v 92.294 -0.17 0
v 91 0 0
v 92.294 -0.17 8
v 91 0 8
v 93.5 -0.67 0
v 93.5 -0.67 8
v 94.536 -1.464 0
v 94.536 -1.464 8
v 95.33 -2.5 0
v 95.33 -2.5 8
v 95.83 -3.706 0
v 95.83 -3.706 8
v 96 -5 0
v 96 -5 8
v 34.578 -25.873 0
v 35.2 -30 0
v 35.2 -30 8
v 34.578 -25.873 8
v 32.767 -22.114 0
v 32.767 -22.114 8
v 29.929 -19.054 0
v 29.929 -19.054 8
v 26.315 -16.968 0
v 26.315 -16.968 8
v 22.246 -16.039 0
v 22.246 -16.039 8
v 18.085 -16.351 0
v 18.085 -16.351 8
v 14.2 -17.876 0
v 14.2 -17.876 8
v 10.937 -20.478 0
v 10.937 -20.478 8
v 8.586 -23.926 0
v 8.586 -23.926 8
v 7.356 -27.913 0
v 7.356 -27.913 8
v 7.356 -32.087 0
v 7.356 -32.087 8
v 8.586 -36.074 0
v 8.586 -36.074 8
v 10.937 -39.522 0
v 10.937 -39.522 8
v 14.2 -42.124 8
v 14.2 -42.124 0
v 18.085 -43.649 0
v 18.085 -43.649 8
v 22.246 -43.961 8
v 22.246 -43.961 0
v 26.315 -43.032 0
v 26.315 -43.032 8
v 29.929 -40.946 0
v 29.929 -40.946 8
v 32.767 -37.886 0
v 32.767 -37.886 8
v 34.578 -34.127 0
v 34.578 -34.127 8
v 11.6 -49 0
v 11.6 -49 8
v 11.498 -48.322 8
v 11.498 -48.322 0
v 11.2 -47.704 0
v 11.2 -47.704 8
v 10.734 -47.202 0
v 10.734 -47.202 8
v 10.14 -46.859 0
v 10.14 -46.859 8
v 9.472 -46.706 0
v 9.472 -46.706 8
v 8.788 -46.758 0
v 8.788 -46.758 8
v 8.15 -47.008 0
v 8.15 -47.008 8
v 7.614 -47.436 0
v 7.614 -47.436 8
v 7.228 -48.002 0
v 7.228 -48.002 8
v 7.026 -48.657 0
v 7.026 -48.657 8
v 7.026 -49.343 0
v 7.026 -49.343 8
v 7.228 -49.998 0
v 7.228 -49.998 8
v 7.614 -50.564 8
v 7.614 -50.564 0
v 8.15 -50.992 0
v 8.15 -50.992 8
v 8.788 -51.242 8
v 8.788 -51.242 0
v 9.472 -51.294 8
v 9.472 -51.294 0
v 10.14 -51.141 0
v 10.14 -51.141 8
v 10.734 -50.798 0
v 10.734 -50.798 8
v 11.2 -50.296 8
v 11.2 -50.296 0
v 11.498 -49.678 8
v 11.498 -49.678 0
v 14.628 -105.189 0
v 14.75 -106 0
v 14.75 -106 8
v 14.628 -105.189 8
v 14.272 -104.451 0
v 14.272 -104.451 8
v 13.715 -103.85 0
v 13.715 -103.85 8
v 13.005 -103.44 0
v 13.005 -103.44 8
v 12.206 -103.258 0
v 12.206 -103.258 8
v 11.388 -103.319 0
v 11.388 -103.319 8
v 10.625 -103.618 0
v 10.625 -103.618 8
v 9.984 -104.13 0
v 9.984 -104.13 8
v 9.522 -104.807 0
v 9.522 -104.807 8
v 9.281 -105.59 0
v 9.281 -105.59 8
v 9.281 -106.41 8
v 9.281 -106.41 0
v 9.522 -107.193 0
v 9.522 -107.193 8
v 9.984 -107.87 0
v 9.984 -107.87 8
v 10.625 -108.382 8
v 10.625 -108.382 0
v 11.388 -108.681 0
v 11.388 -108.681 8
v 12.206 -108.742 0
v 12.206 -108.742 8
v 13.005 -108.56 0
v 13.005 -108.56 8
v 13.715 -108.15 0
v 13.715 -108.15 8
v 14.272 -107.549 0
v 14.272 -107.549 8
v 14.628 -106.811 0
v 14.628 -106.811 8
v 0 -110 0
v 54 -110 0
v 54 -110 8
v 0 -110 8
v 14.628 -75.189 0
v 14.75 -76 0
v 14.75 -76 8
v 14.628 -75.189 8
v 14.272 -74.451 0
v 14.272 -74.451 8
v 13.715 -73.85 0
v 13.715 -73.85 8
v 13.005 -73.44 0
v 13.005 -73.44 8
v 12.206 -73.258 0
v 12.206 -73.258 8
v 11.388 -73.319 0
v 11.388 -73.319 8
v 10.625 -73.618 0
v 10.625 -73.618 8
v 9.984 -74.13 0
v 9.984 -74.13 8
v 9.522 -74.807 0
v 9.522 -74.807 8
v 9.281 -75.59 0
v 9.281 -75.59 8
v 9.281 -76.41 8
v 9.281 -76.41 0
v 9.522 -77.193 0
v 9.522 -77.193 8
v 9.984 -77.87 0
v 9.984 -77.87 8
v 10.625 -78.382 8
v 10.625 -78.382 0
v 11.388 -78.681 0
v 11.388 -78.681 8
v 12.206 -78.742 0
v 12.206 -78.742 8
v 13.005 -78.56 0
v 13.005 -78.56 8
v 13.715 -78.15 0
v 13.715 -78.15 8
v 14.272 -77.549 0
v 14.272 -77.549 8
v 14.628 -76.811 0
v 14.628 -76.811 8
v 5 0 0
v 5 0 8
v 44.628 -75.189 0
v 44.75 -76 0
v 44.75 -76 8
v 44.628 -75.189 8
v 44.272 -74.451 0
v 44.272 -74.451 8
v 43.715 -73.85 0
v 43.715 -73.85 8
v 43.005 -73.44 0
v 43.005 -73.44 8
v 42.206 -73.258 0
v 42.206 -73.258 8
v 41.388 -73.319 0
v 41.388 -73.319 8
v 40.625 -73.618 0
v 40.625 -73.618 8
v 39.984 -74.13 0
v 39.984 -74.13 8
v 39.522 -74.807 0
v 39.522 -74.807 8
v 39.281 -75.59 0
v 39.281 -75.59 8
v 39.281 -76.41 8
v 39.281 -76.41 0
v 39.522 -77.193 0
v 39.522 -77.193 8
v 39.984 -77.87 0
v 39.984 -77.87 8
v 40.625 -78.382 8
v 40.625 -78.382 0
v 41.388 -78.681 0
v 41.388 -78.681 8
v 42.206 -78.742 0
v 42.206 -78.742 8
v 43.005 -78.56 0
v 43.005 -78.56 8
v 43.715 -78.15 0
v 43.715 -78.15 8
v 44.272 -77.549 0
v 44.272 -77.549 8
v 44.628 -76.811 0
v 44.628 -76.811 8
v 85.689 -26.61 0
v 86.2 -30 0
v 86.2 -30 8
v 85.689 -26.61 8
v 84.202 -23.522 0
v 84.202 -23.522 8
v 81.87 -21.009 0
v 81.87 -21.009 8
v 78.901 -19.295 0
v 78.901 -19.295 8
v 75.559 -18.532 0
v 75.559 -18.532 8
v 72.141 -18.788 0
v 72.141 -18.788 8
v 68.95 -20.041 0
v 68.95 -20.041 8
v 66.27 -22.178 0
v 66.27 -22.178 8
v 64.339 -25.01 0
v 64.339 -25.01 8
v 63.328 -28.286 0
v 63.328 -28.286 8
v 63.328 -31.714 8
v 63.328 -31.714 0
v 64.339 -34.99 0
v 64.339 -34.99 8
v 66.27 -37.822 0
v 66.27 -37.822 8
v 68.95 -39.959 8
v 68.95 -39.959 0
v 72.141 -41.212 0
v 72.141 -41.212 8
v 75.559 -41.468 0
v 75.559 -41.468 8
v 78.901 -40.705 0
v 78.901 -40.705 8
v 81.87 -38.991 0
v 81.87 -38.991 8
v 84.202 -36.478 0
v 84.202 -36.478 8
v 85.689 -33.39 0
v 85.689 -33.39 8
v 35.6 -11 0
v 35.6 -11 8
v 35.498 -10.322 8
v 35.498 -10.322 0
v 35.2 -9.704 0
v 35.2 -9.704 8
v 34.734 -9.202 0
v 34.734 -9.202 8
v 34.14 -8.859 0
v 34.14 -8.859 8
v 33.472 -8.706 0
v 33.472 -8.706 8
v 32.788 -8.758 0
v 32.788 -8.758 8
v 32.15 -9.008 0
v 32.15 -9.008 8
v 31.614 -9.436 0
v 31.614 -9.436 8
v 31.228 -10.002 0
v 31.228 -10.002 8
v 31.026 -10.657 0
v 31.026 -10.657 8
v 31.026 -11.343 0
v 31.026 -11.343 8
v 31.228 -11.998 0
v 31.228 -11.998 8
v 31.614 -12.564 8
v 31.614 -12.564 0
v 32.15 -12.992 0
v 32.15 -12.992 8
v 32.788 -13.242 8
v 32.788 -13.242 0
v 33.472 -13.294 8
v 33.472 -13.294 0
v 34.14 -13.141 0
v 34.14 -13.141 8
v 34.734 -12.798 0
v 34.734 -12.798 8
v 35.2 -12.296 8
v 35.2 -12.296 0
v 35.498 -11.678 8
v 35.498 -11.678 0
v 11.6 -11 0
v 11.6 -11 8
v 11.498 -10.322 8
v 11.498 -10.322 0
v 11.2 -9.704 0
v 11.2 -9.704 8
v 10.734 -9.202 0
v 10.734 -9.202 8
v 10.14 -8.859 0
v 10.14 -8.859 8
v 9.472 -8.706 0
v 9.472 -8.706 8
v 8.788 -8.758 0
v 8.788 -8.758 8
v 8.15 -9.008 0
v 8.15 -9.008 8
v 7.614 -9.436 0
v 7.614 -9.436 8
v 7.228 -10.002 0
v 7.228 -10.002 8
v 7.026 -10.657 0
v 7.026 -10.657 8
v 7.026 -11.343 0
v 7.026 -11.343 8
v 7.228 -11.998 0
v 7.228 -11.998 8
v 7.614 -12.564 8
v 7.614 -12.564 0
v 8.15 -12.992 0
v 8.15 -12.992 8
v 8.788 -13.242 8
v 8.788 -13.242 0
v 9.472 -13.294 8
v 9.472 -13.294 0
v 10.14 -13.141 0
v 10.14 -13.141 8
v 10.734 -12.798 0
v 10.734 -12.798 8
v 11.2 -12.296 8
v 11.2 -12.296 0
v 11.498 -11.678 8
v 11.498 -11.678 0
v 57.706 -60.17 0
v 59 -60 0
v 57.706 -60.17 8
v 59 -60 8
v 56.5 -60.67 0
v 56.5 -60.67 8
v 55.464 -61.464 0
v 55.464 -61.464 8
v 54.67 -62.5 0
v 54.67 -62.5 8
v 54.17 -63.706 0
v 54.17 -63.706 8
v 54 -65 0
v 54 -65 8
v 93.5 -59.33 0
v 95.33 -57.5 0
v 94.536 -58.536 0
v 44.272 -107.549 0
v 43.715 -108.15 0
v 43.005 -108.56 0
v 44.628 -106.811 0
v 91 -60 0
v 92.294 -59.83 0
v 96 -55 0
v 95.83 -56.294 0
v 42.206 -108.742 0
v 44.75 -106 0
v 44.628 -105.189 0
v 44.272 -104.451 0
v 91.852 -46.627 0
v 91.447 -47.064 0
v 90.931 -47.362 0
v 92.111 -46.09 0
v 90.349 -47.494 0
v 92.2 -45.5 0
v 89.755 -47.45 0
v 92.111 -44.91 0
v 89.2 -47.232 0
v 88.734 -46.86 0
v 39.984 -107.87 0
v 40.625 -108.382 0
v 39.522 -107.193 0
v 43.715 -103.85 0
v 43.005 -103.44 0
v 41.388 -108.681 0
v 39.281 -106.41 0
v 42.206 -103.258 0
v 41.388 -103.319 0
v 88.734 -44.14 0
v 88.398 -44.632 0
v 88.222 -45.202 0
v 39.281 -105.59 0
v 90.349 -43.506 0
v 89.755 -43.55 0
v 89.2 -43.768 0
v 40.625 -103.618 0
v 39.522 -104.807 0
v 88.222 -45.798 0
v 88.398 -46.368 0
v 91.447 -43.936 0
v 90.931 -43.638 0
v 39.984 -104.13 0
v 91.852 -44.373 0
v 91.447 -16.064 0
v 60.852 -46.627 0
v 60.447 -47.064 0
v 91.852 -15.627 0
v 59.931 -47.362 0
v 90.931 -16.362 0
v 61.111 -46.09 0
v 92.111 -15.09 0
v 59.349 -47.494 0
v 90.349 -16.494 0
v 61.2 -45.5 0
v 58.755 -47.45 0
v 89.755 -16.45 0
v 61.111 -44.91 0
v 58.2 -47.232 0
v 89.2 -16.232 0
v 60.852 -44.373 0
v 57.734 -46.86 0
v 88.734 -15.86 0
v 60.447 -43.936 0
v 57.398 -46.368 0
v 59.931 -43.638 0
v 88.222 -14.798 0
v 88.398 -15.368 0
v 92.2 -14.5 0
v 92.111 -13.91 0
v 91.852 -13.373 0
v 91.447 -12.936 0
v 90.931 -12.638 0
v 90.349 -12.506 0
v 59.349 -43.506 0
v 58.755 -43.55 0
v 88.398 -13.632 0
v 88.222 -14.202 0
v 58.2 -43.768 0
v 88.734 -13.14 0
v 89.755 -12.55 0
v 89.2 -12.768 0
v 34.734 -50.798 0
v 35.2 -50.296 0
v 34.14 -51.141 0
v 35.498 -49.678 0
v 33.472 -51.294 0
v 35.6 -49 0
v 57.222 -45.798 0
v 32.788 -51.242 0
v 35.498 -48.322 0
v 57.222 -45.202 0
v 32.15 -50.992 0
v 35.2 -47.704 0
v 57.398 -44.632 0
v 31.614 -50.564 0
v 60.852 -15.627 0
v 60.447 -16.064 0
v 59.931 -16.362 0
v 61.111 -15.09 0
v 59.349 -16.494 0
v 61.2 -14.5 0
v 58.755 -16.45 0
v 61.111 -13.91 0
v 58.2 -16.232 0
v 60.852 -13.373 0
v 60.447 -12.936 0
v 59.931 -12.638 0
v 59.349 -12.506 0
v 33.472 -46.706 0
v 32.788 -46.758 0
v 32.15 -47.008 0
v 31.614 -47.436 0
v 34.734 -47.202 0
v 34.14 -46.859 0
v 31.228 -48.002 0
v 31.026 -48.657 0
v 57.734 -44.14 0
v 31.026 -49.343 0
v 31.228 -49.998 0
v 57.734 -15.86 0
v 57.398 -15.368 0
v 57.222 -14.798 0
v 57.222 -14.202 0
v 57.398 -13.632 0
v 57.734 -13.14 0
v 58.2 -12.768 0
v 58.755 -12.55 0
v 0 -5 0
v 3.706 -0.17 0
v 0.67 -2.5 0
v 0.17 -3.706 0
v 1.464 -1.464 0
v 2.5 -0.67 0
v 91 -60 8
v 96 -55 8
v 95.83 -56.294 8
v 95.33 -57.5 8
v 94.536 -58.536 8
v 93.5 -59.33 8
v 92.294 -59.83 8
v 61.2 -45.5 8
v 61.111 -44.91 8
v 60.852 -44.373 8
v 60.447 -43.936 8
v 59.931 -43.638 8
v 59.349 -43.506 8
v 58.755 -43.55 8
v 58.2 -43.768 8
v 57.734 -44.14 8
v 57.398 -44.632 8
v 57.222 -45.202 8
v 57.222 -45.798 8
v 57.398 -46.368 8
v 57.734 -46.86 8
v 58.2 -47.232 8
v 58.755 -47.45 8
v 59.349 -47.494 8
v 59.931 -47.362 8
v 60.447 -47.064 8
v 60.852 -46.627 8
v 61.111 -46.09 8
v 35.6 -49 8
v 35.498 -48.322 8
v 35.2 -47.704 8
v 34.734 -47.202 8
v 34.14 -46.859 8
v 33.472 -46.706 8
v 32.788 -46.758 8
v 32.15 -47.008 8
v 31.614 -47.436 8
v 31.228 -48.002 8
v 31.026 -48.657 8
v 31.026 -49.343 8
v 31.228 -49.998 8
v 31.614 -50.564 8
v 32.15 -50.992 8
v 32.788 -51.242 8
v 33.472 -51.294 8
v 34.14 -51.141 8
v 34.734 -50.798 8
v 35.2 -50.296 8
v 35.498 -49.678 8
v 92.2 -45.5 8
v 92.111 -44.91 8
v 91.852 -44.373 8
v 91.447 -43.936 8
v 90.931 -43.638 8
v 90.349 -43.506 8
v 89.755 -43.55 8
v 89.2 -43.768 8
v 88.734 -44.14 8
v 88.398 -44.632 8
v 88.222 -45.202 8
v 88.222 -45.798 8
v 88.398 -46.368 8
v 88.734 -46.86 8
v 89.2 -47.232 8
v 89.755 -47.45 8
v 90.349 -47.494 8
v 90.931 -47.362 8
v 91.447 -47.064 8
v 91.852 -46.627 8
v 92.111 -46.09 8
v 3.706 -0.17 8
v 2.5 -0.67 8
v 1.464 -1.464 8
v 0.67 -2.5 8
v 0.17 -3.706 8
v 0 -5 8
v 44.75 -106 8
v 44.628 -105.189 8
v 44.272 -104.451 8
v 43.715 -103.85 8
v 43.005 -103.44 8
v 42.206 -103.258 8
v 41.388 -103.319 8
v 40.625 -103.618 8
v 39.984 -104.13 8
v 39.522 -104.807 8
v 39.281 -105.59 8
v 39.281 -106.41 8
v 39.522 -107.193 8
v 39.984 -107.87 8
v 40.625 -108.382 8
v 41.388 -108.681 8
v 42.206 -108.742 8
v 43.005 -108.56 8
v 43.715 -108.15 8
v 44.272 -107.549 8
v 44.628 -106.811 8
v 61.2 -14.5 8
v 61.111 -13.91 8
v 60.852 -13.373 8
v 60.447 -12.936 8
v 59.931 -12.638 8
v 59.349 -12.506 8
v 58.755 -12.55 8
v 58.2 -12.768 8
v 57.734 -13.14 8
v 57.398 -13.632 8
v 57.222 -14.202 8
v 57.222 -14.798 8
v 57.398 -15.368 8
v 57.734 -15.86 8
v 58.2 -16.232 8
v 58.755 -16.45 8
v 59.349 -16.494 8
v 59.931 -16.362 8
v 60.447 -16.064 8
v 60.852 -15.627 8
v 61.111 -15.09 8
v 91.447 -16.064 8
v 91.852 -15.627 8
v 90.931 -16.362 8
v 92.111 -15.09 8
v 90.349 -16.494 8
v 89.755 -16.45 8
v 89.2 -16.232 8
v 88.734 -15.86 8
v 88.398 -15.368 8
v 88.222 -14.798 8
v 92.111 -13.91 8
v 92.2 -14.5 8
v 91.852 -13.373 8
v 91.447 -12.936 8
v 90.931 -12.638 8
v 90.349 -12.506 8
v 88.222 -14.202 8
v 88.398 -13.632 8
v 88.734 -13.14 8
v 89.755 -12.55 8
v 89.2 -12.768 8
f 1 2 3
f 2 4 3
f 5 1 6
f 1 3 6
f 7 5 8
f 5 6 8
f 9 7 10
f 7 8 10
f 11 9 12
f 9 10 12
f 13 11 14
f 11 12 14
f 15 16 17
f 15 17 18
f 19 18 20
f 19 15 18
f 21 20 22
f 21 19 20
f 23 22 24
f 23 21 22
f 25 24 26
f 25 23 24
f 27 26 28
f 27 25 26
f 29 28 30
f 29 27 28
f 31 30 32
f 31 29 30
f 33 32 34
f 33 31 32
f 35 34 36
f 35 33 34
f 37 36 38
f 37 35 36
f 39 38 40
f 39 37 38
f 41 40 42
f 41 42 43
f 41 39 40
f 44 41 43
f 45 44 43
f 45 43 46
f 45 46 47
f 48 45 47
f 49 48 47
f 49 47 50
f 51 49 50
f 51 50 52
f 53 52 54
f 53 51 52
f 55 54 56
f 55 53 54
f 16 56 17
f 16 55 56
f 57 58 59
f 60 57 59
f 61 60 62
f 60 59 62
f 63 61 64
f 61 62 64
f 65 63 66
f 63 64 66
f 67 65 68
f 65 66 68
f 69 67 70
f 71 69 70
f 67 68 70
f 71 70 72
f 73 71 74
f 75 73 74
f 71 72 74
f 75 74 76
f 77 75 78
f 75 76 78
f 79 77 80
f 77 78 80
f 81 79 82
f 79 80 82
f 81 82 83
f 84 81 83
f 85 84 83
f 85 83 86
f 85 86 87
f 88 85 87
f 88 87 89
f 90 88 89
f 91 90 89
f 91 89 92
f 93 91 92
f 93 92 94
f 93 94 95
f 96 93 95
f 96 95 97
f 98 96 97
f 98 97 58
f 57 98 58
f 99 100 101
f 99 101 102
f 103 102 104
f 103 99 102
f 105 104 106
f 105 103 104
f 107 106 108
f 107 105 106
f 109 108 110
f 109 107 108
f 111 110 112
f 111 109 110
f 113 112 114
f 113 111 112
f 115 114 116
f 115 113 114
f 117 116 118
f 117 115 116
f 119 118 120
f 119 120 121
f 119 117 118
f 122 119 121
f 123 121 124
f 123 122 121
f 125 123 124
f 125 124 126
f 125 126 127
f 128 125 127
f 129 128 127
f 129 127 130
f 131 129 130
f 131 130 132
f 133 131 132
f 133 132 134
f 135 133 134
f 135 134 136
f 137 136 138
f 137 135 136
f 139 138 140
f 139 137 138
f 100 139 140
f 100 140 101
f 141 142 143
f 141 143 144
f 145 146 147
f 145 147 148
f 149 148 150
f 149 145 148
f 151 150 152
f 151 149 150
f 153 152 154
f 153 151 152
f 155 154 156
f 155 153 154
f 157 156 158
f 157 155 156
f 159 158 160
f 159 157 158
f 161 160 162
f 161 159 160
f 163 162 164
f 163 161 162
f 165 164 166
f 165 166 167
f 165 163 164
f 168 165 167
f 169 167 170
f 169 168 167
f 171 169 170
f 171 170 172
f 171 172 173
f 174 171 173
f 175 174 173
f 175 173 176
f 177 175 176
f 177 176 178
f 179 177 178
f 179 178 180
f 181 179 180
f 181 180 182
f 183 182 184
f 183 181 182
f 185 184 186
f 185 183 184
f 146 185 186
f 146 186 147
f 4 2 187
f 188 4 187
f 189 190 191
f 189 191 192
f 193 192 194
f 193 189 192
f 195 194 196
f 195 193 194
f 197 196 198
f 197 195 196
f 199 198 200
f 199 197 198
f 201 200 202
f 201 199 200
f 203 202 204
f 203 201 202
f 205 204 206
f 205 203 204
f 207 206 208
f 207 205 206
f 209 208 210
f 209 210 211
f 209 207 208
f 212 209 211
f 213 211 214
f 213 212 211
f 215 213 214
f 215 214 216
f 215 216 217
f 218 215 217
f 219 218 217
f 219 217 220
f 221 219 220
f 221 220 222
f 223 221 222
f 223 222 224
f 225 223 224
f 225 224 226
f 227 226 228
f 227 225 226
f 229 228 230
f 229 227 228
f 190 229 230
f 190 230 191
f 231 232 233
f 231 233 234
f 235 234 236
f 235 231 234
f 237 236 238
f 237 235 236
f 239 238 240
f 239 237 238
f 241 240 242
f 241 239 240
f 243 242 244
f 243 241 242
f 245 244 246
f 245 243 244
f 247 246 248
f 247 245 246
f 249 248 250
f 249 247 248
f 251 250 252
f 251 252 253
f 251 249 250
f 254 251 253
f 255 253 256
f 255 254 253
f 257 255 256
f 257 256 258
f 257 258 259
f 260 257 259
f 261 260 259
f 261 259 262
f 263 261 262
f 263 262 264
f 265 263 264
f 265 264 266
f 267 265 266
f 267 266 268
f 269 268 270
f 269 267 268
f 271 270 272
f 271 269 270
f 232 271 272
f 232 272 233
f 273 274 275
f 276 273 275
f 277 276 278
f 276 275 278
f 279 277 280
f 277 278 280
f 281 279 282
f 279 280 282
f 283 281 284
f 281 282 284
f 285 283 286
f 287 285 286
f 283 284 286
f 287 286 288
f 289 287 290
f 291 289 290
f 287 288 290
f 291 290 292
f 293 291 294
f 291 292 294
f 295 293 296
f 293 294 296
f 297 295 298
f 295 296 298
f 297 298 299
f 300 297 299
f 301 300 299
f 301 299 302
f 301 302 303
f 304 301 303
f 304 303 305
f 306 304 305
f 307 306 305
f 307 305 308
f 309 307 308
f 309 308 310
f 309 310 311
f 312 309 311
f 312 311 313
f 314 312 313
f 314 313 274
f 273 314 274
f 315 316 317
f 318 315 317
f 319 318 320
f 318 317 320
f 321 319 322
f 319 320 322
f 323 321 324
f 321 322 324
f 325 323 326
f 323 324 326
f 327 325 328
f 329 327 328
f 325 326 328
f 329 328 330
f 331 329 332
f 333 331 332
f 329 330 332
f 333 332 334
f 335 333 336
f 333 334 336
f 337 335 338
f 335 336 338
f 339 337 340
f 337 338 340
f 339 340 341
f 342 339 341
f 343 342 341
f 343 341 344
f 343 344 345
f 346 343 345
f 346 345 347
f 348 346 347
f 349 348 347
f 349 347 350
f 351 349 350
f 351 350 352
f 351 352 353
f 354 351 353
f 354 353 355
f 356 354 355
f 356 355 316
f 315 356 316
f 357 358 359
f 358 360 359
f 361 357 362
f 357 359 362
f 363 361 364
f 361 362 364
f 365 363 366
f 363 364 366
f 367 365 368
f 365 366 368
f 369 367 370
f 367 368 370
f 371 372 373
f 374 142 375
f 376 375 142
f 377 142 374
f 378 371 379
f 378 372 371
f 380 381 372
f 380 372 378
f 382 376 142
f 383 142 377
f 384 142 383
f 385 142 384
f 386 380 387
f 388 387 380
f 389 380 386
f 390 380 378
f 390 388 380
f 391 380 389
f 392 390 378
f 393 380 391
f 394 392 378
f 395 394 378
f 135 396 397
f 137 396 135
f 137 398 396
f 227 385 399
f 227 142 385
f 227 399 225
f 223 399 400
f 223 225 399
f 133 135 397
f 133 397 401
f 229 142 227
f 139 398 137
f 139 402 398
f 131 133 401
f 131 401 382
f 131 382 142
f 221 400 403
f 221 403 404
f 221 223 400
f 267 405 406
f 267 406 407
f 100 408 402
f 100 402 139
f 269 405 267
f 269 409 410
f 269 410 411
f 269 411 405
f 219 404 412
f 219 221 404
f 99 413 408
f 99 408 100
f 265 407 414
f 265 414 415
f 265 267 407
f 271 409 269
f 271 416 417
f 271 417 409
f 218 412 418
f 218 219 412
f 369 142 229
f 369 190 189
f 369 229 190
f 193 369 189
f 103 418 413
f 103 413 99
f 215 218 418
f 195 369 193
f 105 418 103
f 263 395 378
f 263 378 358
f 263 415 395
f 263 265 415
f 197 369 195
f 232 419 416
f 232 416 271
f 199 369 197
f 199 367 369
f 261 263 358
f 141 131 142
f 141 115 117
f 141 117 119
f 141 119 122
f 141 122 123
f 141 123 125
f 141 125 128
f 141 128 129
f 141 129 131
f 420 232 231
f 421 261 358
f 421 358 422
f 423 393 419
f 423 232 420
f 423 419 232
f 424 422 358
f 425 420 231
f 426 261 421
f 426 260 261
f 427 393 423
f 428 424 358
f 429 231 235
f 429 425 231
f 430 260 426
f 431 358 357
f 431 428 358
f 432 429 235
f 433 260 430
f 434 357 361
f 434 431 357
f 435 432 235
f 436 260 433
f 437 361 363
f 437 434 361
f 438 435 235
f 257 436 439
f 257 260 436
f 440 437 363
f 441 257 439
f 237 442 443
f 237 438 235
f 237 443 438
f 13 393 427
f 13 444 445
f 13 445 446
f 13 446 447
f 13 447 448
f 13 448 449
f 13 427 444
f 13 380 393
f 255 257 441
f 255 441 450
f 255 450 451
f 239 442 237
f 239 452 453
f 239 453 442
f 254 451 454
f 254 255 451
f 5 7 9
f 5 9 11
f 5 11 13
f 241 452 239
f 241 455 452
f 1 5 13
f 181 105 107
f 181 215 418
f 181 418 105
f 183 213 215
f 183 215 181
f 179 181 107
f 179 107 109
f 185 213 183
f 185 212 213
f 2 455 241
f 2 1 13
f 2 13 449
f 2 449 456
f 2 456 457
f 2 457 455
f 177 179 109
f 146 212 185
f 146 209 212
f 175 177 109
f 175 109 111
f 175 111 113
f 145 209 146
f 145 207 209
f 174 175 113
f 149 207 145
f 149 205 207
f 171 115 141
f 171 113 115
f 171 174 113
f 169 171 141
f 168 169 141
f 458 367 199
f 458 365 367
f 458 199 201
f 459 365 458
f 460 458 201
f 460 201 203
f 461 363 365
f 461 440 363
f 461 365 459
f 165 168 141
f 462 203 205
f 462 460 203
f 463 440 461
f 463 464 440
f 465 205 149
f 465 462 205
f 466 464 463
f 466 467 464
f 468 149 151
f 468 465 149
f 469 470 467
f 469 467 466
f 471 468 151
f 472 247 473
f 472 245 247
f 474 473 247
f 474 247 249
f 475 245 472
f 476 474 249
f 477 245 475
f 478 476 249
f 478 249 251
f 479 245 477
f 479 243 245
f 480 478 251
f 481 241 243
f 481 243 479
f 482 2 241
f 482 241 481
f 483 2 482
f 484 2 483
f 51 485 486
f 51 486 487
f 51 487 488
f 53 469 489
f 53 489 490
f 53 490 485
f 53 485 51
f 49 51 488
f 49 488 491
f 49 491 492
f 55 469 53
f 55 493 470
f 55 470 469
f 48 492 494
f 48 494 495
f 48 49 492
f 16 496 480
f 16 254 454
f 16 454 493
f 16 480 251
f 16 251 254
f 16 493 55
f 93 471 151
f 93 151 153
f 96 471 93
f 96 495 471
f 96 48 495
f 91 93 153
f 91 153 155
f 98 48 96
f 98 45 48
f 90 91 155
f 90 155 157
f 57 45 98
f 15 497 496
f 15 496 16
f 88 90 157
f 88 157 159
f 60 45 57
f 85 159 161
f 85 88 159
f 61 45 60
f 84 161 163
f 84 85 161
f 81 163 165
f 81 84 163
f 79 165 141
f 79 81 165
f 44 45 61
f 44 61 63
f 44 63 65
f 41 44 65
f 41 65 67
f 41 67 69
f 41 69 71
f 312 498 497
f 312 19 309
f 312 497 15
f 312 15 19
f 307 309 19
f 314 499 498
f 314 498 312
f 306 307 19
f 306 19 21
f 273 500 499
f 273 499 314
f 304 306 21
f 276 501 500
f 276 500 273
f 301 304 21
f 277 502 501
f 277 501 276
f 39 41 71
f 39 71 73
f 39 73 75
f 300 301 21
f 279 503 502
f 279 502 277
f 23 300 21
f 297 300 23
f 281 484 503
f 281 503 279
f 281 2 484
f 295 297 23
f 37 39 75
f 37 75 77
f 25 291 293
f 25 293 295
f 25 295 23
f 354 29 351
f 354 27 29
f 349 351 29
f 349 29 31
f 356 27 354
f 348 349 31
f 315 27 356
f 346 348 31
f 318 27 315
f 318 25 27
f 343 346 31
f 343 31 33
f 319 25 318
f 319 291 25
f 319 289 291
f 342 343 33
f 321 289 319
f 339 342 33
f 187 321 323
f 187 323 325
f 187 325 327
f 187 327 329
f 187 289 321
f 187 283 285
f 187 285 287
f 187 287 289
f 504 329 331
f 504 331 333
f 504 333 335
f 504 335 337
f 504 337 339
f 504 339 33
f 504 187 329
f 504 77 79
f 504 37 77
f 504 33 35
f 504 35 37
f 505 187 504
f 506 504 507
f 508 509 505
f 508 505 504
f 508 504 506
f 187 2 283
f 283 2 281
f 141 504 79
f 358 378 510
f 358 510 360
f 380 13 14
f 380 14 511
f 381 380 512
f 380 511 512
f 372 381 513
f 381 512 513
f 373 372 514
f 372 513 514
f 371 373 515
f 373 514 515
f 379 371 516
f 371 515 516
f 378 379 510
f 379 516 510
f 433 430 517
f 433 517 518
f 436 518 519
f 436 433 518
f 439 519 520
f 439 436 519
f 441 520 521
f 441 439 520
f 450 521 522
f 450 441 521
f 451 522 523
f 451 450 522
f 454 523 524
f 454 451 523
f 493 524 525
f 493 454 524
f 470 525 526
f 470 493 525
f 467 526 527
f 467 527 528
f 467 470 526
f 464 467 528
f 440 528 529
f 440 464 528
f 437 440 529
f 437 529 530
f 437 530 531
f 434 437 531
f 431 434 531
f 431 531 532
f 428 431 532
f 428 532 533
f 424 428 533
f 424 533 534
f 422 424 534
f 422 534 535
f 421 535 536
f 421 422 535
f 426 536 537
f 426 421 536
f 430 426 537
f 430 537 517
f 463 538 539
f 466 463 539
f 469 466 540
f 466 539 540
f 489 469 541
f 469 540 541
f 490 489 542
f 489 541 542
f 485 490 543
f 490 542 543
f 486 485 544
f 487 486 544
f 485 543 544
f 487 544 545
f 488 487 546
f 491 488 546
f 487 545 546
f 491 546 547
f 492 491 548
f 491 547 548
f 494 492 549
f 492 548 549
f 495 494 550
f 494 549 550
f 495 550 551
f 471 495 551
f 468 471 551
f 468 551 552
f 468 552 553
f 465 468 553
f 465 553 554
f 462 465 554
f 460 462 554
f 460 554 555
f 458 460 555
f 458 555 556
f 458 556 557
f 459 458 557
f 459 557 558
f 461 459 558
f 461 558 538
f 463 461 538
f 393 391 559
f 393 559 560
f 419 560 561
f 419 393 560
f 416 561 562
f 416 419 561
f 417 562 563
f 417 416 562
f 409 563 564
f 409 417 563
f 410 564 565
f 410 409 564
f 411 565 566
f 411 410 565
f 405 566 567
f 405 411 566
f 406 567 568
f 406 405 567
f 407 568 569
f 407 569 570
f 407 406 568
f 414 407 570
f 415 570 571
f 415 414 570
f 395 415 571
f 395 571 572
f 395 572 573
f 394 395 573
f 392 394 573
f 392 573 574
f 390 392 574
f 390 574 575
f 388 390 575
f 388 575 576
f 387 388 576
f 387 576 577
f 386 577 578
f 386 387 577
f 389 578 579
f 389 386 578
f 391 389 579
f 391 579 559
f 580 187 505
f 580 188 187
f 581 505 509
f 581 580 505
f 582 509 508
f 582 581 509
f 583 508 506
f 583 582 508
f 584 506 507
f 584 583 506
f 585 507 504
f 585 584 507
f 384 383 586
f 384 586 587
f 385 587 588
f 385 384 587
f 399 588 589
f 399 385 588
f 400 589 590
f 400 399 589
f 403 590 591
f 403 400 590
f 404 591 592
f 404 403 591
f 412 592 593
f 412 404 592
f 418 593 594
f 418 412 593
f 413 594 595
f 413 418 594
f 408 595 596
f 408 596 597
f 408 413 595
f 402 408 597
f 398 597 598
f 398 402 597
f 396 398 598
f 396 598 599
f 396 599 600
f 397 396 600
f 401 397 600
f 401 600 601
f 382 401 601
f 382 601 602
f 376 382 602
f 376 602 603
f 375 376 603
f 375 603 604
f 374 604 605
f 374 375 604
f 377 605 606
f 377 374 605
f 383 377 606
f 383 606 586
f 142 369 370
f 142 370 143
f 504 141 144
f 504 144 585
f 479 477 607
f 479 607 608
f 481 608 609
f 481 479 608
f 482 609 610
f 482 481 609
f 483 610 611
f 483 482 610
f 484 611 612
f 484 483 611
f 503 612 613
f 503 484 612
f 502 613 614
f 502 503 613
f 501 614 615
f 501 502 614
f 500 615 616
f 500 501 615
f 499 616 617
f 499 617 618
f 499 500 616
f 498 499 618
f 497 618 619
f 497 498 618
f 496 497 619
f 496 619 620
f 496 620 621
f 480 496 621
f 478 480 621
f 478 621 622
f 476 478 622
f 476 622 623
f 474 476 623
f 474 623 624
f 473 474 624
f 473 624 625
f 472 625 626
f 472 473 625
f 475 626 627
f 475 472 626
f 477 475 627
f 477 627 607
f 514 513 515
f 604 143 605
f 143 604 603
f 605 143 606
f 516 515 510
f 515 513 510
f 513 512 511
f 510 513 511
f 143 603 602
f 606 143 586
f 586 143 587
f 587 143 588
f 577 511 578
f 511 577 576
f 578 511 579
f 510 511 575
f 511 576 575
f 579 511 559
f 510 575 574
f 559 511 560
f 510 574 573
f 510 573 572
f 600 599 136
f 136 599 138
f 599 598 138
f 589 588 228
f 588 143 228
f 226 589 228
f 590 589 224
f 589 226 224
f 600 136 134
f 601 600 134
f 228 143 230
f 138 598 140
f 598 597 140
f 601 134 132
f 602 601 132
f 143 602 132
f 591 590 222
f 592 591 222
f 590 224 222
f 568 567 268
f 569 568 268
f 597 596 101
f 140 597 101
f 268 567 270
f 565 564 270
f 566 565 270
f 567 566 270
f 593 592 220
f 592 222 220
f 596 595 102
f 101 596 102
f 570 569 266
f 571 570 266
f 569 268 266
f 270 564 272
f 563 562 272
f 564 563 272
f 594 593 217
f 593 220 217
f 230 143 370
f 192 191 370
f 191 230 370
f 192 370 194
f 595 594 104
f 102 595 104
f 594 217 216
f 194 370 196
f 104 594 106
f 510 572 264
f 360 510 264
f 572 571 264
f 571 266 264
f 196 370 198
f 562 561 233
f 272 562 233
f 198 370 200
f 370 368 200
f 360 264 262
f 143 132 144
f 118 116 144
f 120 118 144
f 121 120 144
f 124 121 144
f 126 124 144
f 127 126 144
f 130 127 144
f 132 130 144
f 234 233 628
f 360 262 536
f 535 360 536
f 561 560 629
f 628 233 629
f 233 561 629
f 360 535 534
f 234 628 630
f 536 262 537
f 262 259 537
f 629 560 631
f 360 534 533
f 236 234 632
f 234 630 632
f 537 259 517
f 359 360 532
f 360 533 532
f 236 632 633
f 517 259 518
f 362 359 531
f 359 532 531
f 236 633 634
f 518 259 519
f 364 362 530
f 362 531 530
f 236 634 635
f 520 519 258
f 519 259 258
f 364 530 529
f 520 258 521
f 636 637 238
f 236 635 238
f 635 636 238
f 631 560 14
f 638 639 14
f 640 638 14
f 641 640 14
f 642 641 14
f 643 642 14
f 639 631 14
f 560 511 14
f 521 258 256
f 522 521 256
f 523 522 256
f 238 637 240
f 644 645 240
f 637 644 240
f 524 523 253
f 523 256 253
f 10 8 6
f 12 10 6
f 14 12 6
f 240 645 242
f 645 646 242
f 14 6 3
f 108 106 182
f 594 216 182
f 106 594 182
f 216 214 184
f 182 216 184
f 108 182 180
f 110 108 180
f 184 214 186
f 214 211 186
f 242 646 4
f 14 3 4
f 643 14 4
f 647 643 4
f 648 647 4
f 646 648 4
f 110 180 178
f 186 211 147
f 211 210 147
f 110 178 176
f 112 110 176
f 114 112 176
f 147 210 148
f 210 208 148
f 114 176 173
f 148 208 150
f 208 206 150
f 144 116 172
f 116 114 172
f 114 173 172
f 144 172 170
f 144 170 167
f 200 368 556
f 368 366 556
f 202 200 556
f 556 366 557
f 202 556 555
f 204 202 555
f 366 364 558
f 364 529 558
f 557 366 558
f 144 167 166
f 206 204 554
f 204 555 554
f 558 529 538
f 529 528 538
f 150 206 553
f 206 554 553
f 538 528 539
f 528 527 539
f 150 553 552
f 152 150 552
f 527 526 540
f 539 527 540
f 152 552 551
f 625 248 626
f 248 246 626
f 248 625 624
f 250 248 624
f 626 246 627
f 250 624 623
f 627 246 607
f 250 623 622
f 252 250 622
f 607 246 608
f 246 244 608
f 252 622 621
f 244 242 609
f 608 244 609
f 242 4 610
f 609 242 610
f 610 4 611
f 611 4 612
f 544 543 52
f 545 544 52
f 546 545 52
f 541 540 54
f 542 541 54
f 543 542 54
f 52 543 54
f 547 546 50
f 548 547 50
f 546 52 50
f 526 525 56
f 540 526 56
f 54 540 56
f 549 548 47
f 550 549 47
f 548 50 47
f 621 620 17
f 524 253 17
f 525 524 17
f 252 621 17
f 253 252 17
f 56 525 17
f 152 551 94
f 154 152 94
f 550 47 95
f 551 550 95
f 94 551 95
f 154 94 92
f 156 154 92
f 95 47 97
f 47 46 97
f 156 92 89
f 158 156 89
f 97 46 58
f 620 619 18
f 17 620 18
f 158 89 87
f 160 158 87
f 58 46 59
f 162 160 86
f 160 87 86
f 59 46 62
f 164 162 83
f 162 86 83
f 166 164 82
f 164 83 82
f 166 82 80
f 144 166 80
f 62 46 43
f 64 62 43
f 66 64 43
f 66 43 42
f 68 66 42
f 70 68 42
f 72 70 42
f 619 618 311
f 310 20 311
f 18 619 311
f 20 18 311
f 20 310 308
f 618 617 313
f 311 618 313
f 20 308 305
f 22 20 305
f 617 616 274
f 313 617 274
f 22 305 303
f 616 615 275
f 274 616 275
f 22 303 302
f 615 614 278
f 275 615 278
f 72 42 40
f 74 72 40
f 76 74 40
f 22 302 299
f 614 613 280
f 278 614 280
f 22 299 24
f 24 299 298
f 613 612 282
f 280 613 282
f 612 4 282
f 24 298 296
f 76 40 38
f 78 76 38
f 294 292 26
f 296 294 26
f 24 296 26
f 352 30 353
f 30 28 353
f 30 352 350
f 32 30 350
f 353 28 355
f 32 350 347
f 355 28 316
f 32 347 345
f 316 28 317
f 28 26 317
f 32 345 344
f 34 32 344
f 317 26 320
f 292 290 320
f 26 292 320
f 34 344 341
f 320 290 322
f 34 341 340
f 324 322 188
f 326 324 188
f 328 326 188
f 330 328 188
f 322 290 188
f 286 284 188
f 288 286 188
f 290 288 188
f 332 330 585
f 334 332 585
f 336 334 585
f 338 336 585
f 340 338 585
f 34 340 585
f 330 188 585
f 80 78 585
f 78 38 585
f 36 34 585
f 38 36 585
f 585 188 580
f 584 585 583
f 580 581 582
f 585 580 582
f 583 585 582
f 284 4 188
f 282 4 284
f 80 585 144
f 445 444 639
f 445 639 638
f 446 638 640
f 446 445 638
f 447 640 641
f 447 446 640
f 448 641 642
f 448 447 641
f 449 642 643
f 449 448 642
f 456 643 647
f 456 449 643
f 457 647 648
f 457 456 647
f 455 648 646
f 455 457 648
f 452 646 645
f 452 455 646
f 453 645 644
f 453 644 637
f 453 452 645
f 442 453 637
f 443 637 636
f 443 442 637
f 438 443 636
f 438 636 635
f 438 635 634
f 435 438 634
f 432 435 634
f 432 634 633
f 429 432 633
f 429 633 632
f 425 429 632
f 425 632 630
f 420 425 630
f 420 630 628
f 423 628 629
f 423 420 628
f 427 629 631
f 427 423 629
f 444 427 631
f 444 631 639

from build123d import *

# Parameters (mm, degrees)
SKETCH_1_R          = 2.75
SKETCH_1_R_2        = 14
SKETCH_1_R_3        = 11.5
SKETCH_1_R_4        = 2
EXTRUDE_1_DEPTH     = 8
FILLET_1_R          = 5
SKETCH_2_R          = 2.3
CUT_EXTRUDE_1_DEPTH = 10


with BuildPart() as part:
    # 草图1 → 凸台-拉伸1 (new body)
    with BuildSketch(Plane.XY):
        Polygon((0, 0), (54, 0), (96, 0), (96, -60), (54, -60), (54, -110), (0, -110), align=None)
        with Locations((12, -106)):
            Circle(SKETCH_1_R, mode=Mode.SUBTRACT)
        with Locations((42, -106)):
            Circle(SKETCH_1_R, mode=Mode.SUBTRACT)
        with Locations((42, -76)):
            Circle(SKETCH_1_R, mode=Mode.SUBTRACT)
        with Locations((12, -76)):
            Circle(SKETCH_1_R, mode=Mode.SUBTRACT)
        with Locations((21.2, -30)):
            Circle(SKETCH_1_R_2, mode=Mode.SUBTRACT)
        with Locations((74.7, -30)):
            Circle(SKETCH_1_R_3, mode=Mode.SUBTRACT)
        with Locations((59.2, -14.5)):
            Circle(SKETCH_1_R_4, mode=Mode.SUBTRACT)
        with Locations((90.2, -14.5)):
            Circle(SKETCH_1_R_4, mode=Mode.SUBTRACT)
        with Locations((90.2, -45.5)):
            Circle(SKETCH_1_R_4, mode=Mode.SUBTRACT)
        with Locations((59.2, -45.5)):
            Circle(SKETCH_1_R_4, mode=Mode.SUBTRACT)
    extrude(amount=EXTRUDE_1_DEPTH)

    # 圆角1
    fillet_1_edges = [part.edges().sort_by_distance(p)[0] for p in [
        (0, 0, 4),
        (96, 0, 4),
        (96, -60, 4),
        (54, -60, 4),
    ]]
    fillet(fillet_1_edges, radius=FILLET_1_R)

    # 草图2 → 切除-拉伸1 (cut)
    with BuildSketch(Plane.XY.offset(8)):
        with Locations((9.3, -11)):
            Circle(SKETCH_2_R)
        with Locations((33.3, -11)):
            Circle(SKETCH_2_R)
        with Locations((33.3, -49)):
            Circle(SKETCH_2_R)
        with Locations((9.3, -49)):
            Circle(SKETCH_2_R)
    extrude(amount=-CUT_EXTRUDE_1_DEPTH, mode=Mode.SUBTRACT)


solid = part.part
